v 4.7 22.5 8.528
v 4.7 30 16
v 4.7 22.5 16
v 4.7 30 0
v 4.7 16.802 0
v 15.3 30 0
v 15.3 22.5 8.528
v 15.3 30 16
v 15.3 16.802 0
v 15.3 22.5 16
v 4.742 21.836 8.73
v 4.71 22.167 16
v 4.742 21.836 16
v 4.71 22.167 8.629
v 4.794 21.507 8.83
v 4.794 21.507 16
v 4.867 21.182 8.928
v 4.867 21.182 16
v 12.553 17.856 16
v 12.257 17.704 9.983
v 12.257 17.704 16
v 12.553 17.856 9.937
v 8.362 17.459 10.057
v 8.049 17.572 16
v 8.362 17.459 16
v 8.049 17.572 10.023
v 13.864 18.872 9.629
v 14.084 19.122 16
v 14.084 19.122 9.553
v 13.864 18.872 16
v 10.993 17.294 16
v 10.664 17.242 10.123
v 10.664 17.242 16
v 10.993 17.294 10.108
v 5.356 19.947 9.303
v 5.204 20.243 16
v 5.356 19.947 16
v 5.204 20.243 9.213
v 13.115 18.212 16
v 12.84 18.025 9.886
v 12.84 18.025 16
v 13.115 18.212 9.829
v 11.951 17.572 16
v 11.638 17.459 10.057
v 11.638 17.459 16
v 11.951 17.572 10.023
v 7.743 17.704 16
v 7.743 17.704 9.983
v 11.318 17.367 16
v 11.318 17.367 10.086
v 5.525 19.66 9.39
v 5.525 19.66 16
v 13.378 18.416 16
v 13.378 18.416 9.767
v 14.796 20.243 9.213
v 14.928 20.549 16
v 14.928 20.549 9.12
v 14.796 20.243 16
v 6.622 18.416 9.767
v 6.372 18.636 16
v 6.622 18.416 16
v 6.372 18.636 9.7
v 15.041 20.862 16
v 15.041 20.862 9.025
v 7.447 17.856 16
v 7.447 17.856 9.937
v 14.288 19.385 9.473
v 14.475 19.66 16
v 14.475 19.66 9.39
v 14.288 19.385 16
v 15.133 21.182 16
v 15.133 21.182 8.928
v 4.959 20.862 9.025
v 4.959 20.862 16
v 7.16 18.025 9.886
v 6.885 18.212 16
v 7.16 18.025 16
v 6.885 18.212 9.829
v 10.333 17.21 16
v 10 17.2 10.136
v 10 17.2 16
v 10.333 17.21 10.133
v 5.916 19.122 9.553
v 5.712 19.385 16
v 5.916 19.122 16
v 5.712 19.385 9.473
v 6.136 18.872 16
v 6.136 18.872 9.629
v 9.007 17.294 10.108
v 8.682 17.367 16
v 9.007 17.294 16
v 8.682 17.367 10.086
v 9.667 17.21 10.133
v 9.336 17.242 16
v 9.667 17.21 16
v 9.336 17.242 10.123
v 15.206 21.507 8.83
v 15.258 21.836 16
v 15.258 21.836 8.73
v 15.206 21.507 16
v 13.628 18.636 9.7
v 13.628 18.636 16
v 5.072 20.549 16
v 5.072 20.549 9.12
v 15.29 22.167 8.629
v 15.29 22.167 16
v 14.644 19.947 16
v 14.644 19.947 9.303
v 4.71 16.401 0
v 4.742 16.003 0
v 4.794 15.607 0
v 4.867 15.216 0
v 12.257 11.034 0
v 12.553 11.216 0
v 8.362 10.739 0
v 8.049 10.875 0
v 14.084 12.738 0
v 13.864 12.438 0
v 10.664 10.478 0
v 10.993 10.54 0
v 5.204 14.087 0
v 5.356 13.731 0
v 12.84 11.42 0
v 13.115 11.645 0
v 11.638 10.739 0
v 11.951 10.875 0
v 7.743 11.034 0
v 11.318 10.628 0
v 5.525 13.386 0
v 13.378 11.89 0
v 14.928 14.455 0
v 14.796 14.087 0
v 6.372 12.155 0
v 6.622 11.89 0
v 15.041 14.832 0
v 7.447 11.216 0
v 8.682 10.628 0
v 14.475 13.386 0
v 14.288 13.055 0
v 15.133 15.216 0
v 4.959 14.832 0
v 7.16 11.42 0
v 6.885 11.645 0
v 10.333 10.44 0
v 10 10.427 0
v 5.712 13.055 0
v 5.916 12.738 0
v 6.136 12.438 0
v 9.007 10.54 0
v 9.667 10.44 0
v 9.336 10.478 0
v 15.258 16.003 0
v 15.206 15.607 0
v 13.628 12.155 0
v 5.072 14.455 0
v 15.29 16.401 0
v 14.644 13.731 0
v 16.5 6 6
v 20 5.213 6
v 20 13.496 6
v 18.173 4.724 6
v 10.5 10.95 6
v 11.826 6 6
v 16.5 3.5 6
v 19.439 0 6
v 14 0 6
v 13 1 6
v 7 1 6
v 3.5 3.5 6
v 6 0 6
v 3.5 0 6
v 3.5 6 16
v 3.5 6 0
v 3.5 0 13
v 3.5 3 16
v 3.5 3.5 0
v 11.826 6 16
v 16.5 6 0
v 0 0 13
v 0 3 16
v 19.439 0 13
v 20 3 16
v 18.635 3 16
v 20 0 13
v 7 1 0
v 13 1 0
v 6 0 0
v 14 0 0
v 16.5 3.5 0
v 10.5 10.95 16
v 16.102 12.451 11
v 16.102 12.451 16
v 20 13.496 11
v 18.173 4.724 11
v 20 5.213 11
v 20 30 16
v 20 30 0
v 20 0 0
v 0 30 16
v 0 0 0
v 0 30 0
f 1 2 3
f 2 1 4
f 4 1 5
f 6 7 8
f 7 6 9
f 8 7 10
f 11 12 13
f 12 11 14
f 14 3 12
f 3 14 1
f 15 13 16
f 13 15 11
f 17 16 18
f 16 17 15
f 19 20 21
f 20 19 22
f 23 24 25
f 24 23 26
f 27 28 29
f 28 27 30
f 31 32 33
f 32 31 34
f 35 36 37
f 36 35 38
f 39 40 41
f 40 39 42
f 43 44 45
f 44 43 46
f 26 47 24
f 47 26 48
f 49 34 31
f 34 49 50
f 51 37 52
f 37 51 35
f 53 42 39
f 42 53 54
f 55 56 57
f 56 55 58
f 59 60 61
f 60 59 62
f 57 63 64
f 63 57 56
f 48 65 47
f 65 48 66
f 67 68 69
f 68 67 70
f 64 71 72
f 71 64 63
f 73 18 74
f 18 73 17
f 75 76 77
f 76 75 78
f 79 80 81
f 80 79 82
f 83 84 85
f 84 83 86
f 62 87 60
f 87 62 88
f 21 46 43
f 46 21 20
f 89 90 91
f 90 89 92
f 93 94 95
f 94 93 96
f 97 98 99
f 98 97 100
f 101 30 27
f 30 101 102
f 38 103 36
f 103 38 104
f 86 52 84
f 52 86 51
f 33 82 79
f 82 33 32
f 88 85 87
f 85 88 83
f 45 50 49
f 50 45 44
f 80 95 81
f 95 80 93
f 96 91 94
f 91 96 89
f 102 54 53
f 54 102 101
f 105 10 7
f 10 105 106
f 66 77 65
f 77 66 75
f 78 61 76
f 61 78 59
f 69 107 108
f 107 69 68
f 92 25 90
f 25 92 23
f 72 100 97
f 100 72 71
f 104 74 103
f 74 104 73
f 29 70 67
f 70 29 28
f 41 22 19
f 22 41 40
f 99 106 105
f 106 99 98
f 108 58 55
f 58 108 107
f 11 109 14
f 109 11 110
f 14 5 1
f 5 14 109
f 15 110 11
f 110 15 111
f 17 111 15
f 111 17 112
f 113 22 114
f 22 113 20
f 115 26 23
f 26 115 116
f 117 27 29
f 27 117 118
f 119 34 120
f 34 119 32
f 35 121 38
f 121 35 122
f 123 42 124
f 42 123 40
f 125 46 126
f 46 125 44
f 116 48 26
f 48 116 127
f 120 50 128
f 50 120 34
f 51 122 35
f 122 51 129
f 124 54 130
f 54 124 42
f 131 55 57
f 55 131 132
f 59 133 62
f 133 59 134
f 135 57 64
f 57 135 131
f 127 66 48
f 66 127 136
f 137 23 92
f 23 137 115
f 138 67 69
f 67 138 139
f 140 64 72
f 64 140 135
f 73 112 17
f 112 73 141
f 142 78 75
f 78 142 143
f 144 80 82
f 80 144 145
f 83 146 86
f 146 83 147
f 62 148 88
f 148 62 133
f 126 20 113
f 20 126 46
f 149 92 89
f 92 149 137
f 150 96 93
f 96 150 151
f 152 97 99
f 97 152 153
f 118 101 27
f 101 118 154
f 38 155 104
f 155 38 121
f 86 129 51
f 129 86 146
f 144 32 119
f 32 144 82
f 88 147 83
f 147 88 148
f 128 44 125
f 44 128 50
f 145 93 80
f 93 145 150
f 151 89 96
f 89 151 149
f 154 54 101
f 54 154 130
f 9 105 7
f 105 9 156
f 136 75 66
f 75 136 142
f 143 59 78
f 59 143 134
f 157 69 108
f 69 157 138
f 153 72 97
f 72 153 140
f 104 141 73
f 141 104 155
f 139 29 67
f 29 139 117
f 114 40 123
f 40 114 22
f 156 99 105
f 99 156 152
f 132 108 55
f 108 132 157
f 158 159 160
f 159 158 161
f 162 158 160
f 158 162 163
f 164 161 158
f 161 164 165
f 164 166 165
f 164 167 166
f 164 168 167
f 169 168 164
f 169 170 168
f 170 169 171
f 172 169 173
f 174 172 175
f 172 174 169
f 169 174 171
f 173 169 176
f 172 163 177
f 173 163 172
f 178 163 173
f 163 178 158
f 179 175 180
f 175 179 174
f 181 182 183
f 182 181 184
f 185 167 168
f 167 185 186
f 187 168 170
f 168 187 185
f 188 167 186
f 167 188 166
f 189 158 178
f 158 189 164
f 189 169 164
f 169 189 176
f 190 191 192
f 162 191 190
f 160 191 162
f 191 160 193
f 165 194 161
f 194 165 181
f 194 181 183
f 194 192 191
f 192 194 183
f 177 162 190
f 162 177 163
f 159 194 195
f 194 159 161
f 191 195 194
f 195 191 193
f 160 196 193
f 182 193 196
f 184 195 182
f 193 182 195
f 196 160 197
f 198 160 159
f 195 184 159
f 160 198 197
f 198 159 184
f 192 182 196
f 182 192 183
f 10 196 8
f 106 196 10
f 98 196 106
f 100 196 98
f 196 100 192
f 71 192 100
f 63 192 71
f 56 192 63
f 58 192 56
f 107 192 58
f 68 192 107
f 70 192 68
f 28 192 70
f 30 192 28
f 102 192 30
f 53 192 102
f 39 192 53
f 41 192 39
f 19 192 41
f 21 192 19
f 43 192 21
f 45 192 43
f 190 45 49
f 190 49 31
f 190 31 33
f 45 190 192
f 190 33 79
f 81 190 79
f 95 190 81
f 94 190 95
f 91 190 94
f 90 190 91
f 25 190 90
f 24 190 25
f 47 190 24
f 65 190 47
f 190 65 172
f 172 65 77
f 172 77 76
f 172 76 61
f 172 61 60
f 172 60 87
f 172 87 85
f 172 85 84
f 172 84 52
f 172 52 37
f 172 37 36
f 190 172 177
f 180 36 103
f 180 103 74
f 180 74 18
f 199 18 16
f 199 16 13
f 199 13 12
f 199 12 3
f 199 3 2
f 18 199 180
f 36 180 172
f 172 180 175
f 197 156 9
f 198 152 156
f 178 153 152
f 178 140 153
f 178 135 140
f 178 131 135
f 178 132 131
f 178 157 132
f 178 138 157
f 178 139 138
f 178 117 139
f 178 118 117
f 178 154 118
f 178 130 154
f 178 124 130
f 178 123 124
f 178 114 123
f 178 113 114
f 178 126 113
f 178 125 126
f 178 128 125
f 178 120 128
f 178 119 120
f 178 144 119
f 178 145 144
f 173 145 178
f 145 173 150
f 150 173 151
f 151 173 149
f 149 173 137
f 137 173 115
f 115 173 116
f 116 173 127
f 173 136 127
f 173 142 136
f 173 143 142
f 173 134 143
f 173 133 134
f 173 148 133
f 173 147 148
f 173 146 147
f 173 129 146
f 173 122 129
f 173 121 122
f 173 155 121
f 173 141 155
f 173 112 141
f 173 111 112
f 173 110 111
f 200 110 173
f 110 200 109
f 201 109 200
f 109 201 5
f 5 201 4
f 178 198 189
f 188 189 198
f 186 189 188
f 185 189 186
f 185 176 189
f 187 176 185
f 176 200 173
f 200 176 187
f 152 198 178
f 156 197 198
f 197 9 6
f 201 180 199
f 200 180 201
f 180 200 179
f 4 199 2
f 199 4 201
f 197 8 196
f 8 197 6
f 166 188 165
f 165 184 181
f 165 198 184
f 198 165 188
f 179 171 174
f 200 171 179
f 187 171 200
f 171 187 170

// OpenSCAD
// Created Code_Ycorner_Endstop.stl
// https://github.com/Mecan0/Code
// By J.Rodigo (www.jra.so)
// Licence Creative commons atribution & share alike.

/**************************/
// Parámetros de la pieza  /
/**************************/

// Diámetro del tornillo (10.6)
dPas = 10.6;	

//Características del final de carrera
hEnd = 13.6;	// Altura (13.6)
wEnd = 5.8;		// Anchura (5.8)
dEnd = 10;		// Profundidad (Inc.pins) (10)


// Pieza principal a trabajar
module bloque(){
	cube([20, 30, 16]);	
}

// Taladro y redondeo en forma de U (Centrado)
// (d,h,u) = (diámetro,altura,largo de vaciado)
module RedU(d,h,u){ 
		// Taladro vertical
		translate([(d/2)+(u-d)/2, 0, 0])
		cube([u, d, h],center=true);
		// Vaciado en forma de U
		translate([0, 0, -h/2])
		rotate( 90, [0, 0, 1])
		cylinder(h = h, r = d/2, $fn=100);
}

// Vaciado en forma de U para el tornillo
module taladro(){
	// Vaciado en forma de U (Vertical)
	translate([10, 22.5, 8])
	rotate( 90, [0, 0, 1])
	RedU(dPas,17,8);
	// Vaciado en forma de U (Inclinado)
	translate([10, 19.08, 3.41])
	rotate(-33.75, [1,0,0])
	rotate( 90, [0, 0, 1])
	RedU(dPas,25,8);
}

// Vaciado y chaflán
module vaciochaflan(){
	// Vaciado plano
	translate([3.5, -1, 6])
	cube([13, 7, 11]);
	// Vaciado chaflán
	translate([-1, 0, 13])
	rotate(45, [1,0,0])
	cube([22, 5, 5]);
}

// Tope para la varilla lisa
module tope(){	
	// Tope de soporte de la varilla lisa
	translate([7, -1, -1])
	cube([6, 2, 8]);
	// Chaflán a 45º
	translate([7, 1, -1])
	rotate(225, [0,0,1])
	cube([2, 2, 8]);
	// Chaflán a 45º
	translate([13, 1, -1])
	rotate(225, [0,0,1])
	cube([2, 2, 8]);
	// Vaciado interior del tope
	translate([3.5, 3.5, -1])
	cube([13, 2.5, 8]);
}

// Zócalo para el final de carrera 
module endstop(){
	translate([10.5, 10.95, 16-dEnd])
	rotate(285, [0,0,1])
	union() {
		// Hueco del final de carrera
		cube([hEnd, wEnd, dEnd+1]);
		//Pasa cables
		cube([8, 10, 5]);
	}
}


// Creamos la pieza a partir del bloque y todas sus operaciones
module pieza(){
	// Bloque principal de la pieza
	difference() {
		bloque();
		union() {
			taladro();
			vaciochaflan();
			tope();
			endstop();
		}
	}
}


// Generamos la pieza!!

	pieza();
